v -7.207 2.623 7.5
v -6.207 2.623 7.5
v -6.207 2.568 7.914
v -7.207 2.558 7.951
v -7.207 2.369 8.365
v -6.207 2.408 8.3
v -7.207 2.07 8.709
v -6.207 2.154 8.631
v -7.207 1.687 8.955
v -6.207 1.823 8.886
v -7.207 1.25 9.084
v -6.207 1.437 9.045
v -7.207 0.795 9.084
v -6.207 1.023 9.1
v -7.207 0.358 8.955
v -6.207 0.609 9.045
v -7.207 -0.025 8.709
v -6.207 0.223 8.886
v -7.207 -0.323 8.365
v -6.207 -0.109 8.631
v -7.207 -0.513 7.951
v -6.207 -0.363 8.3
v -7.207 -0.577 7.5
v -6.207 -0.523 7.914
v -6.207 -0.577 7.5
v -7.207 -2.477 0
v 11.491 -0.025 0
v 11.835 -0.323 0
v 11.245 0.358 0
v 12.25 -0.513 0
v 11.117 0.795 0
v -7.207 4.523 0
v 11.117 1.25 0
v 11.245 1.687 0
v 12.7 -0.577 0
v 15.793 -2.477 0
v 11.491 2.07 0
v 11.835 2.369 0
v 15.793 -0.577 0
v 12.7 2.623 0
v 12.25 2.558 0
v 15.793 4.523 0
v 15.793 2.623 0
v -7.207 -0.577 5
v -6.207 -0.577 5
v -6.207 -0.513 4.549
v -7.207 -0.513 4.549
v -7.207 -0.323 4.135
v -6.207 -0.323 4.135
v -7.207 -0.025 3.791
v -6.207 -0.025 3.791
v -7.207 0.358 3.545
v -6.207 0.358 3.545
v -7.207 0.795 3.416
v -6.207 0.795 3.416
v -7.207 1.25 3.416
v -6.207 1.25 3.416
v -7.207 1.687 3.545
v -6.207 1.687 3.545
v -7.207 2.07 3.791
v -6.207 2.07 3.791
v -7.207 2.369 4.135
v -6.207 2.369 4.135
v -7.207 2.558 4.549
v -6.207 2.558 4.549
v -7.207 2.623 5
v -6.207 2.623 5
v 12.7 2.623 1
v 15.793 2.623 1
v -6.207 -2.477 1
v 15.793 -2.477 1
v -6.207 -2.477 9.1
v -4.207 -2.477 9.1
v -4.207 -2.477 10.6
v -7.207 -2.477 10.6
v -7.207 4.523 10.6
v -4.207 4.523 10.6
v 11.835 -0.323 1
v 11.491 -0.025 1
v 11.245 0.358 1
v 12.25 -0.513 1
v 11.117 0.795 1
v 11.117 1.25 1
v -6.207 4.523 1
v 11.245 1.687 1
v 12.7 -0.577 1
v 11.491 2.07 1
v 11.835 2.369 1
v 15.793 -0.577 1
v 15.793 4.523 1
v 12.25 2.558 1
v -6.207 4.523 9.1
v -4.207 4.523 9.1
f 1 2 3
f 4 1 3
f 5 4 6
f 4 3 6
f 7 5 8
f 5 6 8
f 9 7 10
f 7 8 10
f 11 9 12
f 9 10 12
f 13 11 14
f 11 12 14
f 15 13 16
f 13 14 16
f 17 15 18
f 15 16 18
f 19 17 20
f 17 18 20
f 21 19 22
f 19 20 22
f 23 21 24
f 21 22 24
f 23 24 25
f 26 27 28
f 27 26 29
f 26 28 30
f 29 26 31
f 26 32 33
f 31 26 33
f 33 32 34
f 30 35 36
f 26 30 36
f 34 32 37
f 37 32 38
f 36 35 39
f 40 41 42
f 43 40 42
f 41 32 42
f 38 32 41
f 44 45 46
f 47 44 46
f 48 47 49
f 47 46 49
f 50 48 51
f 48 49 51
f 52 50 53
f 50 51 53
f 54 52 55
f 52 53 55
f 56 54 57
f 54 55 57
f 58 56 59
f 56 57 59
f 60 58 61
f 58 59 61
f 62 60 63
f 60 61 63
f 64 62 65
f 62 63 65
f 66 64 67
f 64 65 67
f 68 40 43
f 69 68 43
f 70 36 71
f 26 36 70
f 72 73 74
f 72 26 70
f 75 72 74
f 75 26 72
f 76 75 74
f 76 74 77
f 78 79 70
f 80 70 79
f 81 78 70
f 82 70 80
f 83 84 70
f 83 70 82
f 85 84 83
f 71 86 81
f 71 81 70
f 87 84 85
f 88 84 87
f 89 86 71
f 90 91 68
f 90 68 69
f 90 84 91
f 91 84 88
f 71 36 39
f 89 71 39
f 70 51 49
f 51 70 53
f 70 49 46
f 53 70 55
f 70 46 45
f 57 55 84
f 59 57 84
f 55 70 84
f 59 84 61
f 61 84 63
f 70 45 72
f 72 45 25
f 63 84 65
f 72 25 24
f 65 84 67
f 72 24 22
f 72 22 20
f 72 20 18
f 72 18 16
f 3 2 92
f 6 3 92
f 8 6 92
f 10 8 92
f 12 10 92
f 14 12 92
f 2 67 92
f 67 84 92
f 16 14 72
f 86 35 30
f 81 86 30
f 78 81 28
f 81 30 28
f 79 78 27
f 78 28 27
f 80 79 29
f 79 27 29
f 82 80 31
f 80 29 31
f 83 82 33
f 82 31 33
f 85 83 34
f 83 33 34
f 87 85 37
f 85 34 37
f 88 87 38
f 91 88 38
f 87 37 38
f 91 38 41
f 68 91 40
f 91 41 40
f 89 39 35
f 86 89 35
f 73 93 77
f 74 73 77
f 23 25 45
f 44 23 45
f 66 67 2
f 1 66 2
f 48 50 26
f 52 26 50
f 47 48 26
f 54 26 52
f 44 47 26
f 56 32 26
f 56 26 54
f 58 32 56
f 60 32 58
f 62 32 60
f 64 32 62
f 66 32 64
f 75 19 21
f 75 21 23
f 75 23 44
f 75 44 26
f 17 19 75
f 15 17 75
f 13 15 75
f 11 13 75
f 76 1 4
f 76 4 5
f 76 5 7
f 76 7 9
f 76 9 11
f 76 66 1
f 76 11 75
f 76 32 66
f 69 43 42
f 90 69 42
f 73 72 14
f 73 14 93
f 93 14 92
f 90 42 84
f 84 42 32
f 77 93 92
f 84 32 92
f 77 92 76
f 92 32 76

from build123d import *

# Parameters (mm, degrees)
DODANIE_WYCI_GNI_CIE1_DEPTH = 1
SZKIC12_W                   = 9.1
SZKIC12_H                   = 7
DODANIE_WYCI_GNI_CIE2_DEPTH = 1
SZKIC15_W                   = 1.5
SZKIC15_H                   = 7
DODANIE_WYCI_GNI_CIE3_DEPTH = 3
WYTNIJ_WYCI_GNI_CIE1_DEPTH  = 1


with BuildPart() as part:
    # Szkic1 → Dodanie-wyciągnięcie1 (new body)
    with BuildSketch(Plane.XY):
        with BuildLine():
            Line((-7.206635208, 4.522640333), (-7.206635208, -2.477359667))
            Line((-7.206635208, -2.477359667), (15.793364792, -2.477359667))
            Line((15.793364792, -2.477359667), (15.793364792, -0.577359667))
            Line((15.793364792, -0.577359667), (13.620412834, -0.577359667))
            Line((13.620412834, -0.577359667), (12.700412834, -0.577359667))
            ThreePointArc((12.700412834, -0.577359667), (11.100412834, 1.022640333), (12.700412834, 2.622640333))
            Line((12.700412834, 2.622640333), (13.620412834, 2.622640333))
            Line((13.620412834, 2.622640333), (15.793364792, 2.622640333))
            Line((15.793364792, 2.622640333), (15.793364792, 4.522640333))
            Line((15.793364792, 4.522640333), (-7.206635208, 4.522640333))
        make_face()
    extrude(amount=DODANIE_WYCI_GNI_CIE1_DEPTH)

    # Szkic12 → Dodanie-wyciągnięcie2 (add)
    with BuildSketch(Plane.ZY.offset(7.206635208)):
        with Locations((4.55, 1.022640333)):
            Rectangle(SZKIC12_W, SZKIC12_H)
    extrude(amount=-DODANIE_WYCI_GNI_CIE2_DEPTH)

    # Szkic15 → Dodanie-wyciągnięcie3 (add)
    with BuildSketch(Plane.ZY.offset(7.206635208)):
        with Locations((9.85, 1.022640333)):
            Rectangle(SZKIC15_W, SZKIC15_H)
    extrude(amount=-DODANIE_WYCI_GNI_CIE3_DEPTH)

    # Szkic16 → Wytnij-wyciągnięcie1 (cut)
    with BuildSketch(Plane(origin=(-6.206635208, 0, 0), x_dir=(0, 0, -1), z_dir=(1, 0, 0))):
        with BuildLine():
            Line((-7.5, -0.577359667), (-5, -0.577359667))
            ThreePointArc((-5, -0.577359667), (-3.4, 1.022640333), (-5, 2.622640333))
            Line((-5, 2.622640333), (-7.5, 2.622640333))
            ThreePointArc((-7.5, 2.622640333), (-9.1, 1.022640333), (-7.5, -0.577359667))
        make_face()
    extrude(amount=-WYTNIJ_WYCI_GNI_CIE1_DEPTH, mode=Mode.SUBTRACT)


solid = part.part
